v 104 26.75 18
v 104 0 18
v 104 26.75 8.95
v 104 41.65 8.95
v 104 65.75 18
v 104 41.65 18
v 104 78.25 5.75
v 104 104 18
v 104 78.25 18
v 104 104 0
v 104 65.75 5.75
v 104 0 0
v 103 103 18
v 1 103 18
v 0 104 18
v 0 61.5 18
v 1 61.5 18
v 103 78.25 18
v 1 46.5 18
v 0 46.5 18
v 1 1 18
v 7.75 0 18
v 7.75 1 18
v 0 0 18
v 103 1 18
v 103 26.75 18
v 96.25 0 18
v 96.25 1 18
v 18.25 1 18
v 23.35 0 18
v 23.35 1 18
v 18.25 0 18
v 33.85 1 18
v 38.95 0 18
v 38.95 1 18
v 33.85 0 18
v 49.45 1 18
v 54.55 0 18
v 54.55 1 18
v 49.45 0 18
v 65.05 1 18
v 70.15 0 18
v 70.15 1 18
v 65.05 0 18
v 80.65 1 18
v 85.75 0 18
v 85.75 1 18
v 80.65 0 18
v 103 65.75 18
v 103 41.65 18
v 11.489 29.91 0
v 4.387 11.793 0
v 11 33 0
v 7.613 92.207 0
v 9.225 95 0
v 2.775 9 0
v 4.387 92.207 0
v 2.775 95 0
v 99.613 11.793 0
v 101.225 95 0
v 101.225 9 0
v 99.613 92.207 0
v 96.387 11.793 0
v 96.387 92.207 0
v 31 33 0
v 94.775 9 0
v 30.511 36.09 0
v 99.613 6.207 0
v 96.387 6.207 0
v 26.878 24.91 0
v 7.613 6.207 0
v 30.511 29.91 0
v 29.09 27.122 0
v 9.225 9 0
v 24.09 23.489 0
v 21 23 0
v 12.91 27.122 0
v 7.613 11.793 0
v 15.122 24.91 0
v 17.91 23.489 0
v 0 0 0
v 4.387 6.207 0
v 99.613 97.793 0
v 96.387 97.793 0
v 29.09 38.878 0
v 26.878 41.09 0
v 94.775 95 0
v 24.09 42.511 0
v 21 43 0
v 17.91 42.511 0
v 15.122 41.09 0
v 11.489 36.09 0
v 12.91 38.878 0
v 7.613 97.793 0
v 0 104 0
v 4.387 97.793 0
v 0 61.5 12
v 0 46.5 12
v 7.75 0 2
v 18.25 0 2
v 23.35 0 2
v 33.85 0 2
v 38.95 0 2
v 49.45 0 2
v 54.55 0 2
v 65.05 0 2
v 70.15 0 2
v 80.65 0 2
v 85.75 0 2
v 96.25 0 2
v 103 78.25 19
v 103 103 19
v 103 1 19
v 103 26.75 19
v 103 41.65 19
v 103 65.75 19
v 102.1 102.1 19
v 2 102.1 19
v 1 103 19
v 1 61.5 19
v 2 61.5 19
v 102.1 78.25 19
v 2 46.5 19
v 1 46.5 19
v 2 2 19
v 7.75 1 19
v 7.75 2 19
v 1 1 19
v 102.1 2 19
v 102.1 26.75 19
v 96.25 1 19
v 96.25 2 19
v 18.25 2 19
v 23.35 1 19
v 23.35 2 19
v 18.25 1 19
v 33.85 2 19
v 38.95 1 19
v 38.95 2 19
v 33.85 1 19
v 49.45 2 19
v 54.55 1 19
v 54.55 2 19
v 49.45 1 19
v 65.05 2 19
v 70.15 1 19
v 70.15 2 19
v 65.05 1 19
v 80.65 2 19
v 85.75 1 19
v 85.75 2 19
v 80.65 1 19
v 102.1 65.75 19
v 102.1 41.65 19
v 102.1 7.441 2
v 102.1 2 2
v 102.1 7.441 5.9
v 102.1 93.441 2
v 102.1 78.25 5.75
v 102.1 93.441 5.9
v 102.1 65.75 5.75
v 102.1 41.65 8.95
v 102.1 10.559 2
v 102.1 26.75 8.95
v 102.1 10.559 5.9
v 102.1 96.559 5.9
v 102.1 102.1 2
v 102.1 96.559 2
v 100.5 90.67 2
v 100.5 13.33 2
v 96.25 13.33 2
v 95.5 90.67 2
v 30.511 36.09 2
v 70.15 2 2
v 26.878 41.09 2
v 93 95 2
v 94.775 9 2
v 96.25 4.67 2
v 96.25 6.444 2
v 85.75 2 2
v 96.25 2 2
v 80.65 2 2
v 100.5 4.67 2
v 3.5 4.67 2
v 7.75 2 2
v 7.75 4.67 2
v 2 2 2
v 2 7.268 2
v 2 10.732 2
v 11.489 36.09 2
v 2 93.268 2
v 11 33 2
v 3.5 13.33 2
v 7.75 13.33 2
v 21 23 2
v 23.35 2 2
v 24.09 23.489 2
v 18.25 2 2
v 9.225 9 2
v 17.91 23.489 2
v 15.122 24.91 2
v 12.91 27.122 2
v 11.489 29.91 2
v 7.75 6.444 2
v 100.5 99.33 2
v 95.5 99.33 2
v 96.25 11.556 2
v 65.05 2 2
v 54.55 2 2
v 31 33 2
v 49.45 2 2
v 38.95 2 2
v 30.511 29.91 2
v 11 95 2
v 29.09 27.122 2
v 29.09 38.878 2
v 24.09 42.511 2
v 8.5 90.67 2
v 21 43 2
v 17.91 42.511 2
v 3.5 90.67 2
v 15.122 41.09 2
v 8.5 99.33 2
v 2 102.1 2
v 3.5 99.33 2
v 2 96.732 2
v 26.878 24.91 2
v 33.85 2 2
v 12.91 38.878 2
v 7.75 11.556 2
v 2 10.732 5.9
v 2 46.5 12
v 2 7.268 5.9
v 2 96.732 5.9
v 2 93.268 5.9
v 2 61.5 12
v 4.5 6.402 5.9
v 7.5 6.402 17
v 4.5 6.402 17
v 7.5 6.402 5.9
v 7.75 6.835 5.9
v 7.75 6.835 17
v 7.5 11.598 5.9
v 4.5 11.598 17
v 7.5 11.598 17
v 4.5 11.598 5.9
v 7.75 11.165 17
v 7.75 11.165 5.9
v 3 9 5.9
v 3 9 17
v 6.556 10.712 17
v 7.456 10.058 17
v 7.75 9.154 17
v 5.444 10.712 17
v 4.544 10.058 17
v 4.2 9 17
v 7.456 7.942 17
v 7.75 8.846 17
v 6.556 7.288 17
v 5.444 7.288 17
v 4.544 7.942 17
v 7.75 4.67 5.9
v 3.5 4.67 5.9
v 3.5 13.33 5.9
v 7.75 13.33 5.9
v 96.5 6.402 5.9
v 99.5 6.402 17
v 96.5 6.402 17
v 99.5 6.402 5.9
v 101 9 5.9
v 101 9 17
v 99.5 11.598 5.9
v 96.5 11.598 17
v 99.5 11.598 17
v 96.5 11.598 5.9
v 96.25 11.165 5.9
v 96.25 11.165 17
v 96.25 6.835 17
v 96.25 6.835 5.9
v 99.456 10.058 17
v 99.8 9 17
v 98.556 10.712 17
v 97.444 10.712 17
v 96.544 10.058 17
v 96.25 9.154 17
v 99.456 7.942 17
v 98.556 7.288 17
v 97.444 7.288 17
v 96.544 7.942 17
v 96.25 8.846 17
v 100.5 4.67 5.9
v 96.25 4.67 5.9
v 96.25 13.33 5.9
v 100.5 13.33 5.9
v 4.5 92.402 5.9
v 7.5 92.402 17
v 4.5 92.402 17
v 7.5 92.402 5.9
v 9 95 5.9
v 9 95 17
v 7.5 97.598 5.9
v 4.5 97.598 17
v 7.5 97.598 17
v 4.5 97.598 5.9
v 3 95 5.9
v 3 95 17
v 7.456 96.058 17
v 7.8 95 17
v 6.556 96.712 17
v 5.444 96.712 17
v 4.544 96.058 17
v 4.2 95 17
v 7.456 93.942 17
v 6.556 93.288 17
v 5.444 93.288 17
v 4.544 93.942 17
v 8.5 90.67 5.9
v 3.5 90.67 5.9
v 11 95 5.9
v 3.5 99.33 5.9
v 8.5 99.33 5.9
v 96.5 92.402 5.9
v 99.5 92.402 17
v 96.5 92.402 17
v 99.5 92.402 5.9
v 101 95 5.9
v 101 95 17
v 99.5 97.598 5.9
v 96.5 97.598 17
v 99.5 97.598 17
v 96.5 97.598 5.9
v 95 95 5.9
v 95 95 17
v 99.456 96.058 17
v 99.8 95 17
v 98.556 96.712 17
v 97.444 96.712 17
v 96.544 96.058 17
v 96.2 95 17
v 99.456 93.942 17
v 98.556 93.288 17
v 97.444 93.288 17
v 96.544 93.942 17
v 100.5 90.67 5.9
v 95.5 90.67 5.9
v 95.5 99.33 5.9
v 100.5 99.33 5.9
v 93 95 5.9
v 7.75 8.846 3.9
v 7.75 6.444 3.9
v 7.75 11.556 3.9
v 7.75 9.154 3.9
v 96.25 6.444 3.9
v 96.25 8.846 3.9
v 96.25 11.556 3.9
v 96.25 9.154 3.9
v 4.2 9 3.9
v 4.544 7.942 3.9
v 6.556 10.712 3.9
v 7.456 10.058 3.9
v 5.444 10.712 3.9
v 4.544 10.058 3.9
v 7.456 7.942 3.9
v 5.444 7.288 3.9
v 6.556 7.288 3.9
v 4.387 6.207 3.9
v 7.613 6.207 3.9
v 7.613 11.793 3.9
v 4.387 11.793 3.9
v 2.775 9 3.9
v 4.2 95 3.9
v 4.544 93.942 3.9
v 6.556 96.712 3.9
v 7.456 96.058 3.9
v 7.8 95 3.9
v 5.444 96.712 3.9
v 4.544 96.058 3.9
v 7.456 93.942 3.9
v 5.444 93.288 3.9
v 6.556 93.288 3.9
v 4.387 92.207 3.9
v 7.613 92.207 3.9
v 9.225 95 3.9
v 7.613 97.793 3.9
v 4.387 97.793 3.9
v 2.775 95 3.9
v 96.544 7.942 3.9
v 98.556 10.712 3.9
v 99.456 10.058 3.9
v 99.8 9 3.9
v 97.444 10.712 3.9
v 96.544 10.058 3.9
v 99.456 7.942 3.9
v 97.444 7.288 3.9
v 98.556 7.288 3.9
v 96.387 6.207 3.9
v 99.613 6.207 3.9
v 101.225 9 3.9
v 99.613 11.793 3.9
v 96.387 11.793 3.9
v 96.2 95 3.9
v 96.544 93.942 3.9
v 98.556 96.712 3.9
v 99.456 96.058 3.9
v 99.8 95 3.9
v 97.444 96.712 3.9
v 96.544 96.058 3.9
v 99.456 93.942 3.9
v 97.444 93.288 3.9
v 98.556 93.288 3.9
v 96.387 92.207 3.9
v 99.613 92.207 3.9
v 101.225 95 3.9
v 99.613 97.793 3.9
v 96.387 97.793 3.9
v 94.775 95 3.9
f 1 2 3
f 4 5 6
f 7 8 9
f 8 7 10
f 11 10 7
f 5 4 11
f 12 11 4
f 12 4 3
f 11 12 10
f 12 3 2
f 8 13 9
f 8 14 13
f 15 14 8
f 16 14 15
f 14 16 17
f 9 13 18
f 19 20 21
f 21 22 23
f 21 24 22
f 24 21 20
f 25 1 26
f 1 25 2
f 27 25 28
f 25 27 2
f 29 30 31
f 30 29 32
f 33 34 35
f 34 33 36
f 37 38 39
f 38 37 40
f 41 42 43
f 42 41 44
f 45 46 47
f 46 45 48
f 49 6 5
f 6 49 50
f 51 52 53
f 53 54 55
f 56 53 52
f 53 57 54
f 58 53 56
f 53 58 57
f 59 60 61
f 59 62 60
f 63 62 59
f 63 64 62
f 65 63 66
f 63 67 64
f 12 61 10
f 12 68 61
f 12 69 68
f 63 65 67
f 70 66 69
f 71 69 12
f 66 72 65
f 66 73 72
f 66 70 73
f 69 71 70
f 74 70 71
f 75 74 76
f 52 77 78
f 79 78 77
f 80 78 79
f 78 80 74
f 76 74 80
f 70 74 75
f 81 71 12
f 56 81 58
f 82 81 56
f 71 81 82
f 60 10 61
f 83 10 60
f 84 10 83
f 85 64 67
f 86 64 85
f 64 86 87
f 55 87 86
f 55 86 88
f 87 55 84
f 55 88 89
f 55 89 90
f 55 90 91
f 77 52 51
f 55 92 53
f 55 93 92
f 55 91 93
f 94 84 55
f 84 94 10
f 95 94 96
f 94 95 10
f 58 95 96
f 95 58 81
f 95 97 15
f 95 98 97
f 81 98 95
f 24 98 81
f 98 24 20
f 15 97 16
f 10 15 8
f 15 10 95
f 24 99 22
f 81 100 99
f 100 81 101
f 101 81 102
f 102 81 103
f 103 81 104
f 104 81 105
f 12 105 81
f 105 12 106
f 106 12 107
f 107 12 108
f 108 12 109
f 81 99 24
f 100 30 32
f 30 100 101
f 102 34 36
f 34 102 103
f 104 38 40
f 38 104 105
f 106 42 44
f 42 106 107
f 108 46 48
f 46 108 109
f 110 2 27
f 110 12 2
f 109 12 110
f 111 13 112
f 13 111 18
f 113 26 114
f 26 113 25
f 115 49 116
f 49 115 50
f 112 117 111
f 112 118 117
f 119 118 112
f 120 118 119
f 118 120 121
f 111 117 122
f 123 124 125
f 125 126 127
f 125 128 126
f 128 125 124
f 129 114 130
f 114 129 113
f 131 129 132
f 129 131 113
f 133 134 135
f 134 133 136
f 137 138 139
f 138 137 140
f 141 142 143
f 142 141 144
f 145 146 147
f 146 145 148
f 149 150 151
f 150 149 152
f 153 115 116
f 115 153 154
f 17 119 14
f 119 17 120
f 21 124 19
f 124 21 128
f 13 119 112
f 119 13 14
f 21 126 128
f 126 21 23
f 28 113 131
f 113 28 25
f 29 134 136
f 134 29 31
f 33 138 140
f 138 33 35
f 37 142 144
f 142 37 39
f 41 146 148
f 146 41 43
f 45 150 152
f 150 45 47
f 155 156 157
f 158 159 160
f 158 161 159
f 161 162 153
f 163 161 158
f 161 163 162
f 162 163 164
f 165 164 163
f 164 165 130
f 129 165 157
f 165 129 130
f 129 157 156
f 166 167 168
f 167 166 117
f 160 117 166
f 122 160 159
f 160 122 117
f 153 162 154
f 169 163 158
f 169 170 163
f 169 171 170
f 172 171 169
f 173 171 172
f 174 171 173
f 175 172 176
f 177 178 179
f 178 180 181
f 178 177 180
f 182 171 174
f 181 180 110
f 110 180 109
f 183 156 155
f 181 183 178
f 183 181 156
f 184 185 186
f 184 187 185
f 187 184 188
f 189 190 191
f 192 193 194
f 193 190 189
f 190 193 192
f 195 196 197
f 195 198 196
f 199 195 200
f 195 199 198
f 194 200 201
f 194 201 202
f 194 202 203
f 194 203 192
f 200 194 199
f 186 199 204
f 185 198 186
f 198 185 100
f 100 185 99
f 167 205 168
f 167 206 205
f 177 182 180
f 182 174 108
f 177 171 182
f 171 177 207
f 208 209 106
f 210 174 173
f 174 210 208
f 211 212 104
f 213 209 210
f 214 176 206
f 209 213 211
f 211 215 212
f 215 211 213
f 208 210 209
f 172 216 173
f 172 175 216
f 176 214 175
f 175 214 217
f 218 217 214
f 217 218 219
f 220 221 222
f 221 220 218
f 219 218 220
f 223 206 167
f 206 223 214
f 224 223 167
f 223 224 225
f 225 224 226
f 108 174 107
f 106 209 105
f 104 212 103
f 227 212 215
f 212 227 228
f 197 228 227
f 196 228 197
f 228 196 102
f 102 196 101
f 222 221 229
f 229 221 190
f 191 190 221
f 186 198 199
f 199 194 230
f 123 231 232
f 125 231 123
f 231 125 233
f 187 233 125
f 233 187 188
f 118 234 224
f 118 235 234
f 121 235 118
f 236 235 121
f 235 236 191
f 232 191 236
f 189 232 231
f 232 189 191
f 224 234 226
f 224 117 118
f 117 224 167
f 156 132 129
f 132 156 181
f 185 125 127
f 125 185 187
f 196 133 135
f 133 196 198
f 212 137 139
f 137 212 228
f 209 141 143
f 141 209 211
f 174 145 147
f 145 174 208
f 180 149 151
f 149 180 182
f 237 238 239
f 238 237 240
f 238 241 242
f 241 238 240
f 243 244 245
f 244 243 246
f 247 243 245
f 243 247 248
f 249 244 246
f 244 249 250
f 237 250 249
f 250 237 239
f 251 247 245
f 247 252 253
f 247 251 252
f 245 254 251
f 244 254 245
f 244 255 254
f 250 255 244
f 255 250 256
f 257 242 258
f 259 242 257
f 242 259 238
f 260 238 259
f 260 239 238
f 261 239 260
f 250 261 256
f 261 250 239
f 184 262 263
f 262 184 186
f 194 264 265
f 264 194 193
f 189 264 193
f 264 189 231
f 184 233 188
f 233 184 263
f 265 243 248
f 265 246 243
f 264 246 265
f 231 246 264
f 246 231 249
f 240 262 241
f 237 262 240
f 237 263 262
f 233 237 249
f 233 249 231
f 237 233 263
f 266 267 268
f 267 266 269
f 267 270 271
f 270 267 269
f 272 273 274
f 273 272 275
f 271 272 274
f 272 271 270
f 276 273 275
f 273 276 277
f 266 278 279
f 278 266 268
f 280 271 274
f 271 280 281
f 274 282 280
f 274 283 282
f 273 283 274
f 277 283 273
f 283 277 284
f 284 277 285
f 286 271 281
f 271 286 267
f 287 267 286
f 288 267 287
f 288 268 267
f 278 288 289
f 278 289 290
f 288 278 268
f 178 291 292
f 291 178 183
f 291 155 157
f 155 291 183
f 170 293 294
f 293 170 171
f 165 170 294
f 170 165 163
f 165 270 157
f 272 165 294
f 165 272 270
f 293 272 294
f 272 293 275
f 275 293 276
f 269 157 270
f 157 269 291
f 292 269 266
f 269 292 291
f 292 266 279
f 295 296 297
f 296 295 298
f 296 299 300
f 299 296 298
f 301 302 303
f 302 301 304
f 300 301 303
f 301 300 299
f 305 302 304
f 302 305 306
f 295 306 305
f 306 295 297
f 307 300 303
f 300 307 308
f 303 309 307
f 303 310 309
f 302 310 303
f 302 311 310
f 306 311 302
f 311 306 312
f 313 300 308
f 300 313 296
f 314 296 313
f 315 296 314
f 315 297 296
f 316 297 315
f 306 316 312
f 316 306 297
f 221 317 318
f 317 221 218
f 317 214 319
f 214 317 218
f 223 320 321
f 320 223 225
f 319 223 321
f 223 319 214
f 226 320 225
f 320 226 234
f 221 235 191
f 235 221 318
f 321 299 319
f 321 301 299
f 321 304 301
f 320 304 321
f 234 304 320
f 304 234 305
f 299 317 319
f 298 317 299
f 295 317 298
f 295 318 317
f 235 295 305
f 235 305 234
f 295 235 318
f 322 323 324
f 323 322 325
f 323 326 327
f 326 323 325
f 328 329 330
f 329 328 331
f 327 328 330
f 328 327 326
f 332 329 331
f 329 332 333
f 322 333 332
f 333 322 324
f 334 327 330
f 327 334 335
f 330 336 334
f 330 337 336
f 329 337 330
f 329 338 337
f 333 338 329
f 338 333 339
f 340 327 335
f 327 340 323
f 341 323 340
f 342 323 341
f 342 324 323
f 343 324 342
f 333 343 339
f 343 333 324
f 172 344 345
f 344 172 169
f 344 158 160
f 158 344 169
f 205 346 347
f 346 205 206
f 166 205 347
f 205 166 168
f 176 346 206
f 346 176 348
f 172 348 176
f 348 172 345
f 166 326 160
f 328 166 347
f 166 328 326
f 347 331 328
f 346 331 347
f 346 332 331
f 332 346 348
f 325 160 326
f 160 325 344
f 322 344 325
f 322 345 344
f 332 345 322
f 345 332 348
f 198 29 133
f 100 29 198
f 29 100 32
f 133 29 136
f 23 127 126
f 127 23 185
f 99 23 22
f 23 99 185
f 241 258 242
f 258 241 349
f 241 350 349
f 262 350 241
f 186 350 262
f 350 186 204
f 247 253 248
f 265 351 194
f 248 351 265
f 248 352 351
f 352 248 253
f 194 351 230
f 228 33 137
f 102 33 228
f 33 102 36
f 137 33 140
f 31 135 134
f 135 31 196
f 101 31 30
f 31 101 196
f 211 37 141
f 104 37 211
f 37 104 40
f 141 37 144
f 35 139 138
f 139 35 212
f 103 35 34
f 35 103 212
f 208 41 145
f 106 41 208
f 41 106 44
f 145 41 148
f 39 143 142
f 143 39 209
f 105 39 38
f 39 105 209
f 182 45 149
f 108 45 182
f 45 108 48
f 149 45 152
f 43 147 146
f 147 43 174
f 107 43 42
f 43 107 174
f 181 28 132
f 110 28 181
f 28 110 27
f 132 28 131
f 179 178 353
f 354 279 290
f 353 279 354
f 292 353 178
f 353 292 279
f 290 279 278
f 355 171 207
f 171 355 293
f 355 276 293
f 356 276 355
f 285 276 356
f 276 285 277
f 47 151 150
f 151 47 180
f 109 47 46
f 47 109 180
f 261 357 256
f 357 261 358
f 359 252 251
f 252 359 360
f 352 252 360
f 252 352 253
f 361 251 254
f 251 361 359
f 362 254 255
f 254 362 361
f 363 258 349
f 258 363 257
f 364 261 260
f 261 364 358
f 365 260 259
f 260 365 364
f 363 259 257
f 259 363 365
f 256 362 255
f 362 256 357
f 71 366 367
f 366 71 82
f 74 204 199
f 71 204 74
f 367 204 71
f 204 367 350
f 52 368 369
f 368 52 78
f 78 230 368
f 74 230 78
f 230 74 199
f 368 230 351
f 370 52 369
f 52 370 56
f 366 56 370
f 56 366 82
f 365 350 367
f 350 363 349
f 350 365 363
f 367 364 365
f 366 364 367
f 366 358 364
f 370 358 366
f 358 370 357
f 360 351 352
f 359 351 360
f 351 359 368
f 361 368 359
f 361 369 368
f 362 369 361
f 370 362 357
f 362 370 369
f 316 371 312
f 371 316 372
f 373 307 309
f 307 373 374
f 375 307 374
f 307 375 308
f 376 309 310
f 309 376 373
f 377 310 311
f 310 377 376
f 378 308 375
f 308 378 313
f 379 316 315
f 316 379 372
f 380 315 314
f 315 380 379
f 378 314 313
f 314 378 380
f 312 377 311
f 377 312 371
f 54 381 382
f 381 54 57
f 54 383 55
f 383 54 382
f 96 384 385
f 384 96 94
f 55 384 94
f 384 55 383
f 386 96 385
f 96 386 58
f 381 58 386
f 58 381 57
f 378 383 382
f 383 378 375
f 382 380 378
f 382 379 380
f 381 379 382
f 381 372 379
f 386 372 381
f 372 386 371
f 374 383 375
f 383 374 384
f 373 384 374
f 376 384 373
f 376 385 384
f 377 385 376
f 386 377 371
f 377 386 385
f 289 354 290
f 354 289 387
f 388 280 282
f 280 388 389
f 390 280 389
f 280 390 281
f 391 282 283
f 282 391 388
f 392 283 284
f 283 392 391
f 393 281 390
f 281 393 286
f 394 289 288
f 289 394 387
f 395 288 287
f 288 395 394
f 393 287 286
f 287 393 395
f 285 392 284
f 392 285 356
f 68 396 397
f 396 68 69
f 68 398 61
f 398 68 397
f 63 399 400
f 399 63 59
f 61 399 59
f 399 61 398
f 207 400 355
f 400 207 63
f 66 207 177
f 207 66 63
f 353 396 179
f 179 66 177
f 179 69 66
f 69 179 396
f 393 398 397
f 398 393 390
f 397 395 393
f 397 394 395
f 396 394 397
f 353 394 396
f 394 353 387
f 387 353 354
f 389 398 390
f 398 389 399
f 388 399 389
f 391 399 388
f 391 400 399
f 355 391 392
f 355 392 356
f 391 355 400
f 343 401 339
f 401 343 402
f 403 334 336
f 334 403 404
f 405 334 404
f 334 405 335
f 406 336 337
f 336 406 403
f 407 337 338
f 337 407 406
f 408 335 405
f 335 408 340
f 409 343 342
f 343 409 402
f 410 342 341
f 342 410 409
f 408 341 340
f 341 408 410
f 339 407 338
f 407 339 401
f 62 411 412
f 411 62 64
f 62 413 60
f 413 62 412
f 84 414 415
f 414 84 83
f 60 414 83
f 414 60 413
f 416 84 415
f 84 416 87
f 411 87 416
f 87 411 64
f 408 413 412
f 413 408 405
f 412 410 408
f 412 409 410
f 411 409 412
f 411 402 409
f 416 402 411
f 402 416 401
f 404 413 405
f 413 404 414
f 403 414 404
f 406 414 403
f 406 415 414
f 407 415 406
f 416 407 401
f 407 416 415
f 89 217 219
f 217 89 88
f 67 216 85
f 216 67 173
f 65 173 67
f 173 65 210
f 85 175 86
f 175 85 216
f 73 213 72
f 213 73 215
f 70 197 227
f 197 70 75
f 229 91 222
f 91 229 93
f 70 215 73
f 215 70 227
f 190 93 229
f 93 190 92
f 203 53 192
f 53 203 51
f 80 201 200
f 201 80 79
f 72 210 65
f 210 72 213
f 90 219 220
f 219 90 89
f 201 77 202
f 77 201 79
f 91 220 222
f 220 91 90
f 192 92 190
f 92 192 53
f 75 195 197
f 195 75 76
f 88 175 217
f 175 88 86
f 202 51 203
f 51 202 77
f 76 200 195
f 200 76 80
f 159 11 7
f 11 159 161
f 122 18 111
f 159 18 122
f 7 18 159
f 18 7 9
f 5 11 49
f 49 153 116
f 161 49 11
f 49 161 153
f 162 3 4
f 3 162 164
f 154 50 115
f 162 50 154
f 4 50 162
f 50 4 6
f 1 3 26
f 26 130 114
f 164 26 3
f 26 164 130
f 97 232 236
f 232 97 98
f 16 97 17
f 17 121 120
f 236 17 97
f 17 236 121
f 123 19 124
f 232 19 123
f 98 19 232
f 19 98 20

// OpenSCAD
tol = 0.25;
screen_tol = 0.8;
pcb_x = 100;
pcb_y = 100;
pcb_z = 4;
bolt_d = 3.6;
shift_bolt = 3;
shift_bolt_x = 4;
shift_bolt_y = 7;
board_w = 1;
board_h = 1;


// box thickness
th = 2;

// bolts
shift_x = th;
shift_y = th;

box_x = pcb_x + 2*th;
box_y = pcb_y + 2*th;

pcb_width = 2;

socket_h = 15;
socket_w = 10;
socket_n = 6;
socket_int = 15.6;
start_socket_x = 6 + shift_x;
eps = 1e-1;

bottom_box_z = socket_h + th + pcb_width;

usb_type_b_w = 12;
usb_type_b_h = 11;
start_type_b_y = shift_y + pcb_y - 36;
start_type_b_z = bottom_box_z - pcb_width - usb_type_b_h - tol;

usb_type_a_w = 14.4;
usb_type_a_h = 7.8;
start_type_a_y = shift_y + 25;
start_type_a_z = bottom_box_z - pcb_width - usb_type_a_h - tol;

// programmator
micro_x = 10;
micro_y = 21.1;
micro_start_x = shift_x + 4.75;
micro_start_y = shift_y + pcb_y - 23.3 - micro_y;

contrast_start_x = shift_x + 38.4;
contrast_start_y = shift_y + 25.7;
//volume_start_x = shift_x + pcb_x - 39.2;
//volume_start_y = contrast_start_y;
pot_d = 7;
under_pcb = 13;
fn = 10;
gaika_h = 4;
gaika_w = 5.5;
stoiki_r = 3;
stoiki_h = socket_h;
wide_stoiki_r = stoiki_r + 2;

dynamic_x = shift_x + 19;
dynamic_y = shift_y + 31;
dynamic_r = 10;

volume_center_y = shift_y + 50;
volume_w = 15;
volume_start_y = shift_y + volume_center_y - volume_w/2;
volume_h = 5;

translate([0,0,-50]) {

!difference() {
  union() {
    difference() {
      union() {
        cube([box_x, box_y, bottom_box_z-board_h], false);
        translate([th - board_w, th - board_w, 0]) {
          cube([box_x - 2*(th - board_w), box_y - 2*(th - board_w), bottom_box_z], false);
        }
      }
      translate([th, th, th]) {
        cube([box_x-2*th+eps, box_y-2*th+eps, bottom_box_z-th+eps], false);
      }
    }
    // under_pcb, stoiki
    for (dy = [shift_y+shift_bolt_y, shift_y+pcb_y-shift_bolt_y]) {
      for (dx = [shift_x+shift_bolt_x, shift_x+pcb_x-shift_bolt_x]) {
        translate([dx,dy,th-eps]) {
          cylinder($fn=6, r=stoiki_r, h=stoiki_h + eps);
          cylinder($fn=6, r=wide_stoiki_r, h=gaika_h);
        }
      }
    }
    //translate([box_x/2, box_y/2, th-eps]) {
      //cylinder($fn=6, r=stoiki_r, h=pcb_up);
    //}
  }

  // dynamic
  translate([dynamic_x, dynamic_y, -eps]) {
      cylinder($fn=20, r=dynamic_r, h = th+2*eps);
  }

  // sockets
  for (i = [0:1:socket_n-1]) {
      translate([start_socket_x+i*socket_int - tol, -eps, bottom_box_z - socket_h - pcb_width]) {
        cube(size=[socket_w + 2*tol, socket_h, socket_h + socket_h]);
      }
  }
  // bolts
  for (dx = [shift_x+shift_bolt_x, shift_x+pcb_x-shift_bolt_x]) {
    for (dy = [shift_y+shift_bolt_y, shift_y+pcb_y-shift_bolt_y]) {
      translate([dx,dy,-eps]) {
        cylinder($fn=fn, r=bolt_d/2, h=th+stoiki_h+2*eps);
        // gaika
        cylinder($fn=6, r=gaika_w / 2 / cos(30) + 0.05, h=gaika_h);
      }
    }
  }

//    // usb_in1 type b
    translate([box_x-th-eps, start_type_b_y-tol, start_type_b_z]) {
        cube(size=[th+2*eps, usb_type_b_w + 2*tol, bottom_box_z]);
    }

    // usb_out1 type a
    translate([box_x - eps - th, start_type_a_y - tol, start_type_a_z]) {
        cube(size=[th+2*eps, usb_type_a_w + 2*tol, bottom_box_z]);
    }

    // volume
    translate([-eps, volume_start_y, bottom_box_z - pcb_width - volume_h]) {
        cube(size=[th+2*eps, volume_w, volume_h + th + eps]);
    }

}
}

top_box_z = 15 + th;
//stoiki_h = top_box_z - th;
wide_stoiki_h = 4;
pcb_room = 1;
screen_start_x = shift_x + 29;
screen_start_y = shift_y + 38.9;
screen_length_x = 71.2;
screen_length_y = 24.2;
screen_hold_x = 40;
screen_hold_y = 4;
screen_hold_start_z = 12.5;
screen_hold_y_shift = 2;
screen_hold_up_x = 15;
screen_hold_up_x_shift = 5;

master_button_y = shift_y + 10;
master_button_x = shift_x + 43;
master_button_int = 21.8;
master_button_r = 5;
top_bolt_h = 1.5;
top_bolt_r = 3.5;
speaker_shift = 18;
speaker_r = 15;
speaker_h = 15;
speaker_hole_d = 10;
speaker_hole_int = 3;
speaker_hole_w = 1.5;
speaker_shift = 18;

difference() {
  union() {
    // board
    translate([0, 0, -board_h]) {
        difference() {
            cube([box_x, box_y, board_h + eps], false);
            translate([board_w, board_w, -eps]) {
                cube([box_x - 2*board_w, box_y - 2*board_w, board_h + 3*eps], false);
            }
        }
    }
    difference() {
      cube([box_x,box_y,top_box_z], false);
      translate([th, th, -eps]) {
        cube([box_x-2*th+eps, box_y-2*th+eps, top_box_z-th+eps], false);
      }
    }
    // stoiki
    for (dx = [shift_x+shift_bolt, shift_x+pcb_x-shift_bolt]) {
      for (dy = [shift_y+shift_bolt, shift_y+pcb_y-shift_bolt]) {
        translate([dx,dy,pcb_room]) {
          cylinder($fn=6, r=stoiki_r, h=top_box_z-th+eps);
        }
        translate([dx,dy,top_box_z-th-wide_stoiki_h+eps]) {
          cylinder($fn=6, r=wide_stoiki_r, h=wide_stoiki_h+th-2*eps);
        }
      }
    }
    // screen_hold
    translate([screen_start_x + (screen_length_x - screen_hold_x)/2, screen_start_y - screen_hold_y_shift - screen_hold_y, screen_hold_start_z]) {
	cube([screen_hold_x, screen_hold_y, top_box_z - screen_hold_start_z - th + eps]);
    }
    translate([screen_start_x + screen_length_x - screen_hold_up_x - screen_hold_up_x_shift, screen_start_y + screen_length_y + screen_hold_y_shift, screen_hold_start_z]) {
	cube([screen_hold_up_x, screen_hold_y, top_box_z - screen_hold_start_z - th + eps]);
    }
  }
  // - speaker na stoikah
  translate([shift_x + pcb_x - 18, shift_y + 18, 0]) {
    cylinder(r=speaker_r, h = 15, $fn=20);
  }
  // speaker_hole
  for (dy = [shift_y + speaker_shift - speaker_hole_int - speaker_hole_w*3/2, 
             shift_y + speaker_shift - speaker_hole_w/2, 
             shift_y + speaker_shift + speaker_hole_int + speaker_hole_w/2]) { 
    translate([shift_x + pcb_x - speaker_shift - speaker_hole_d, dy, top_box_z-th-eps]) {
      cube(size=[speaker_hole_d, speaker_hole_w, th + 2*eps]);
    }
  }

  // bolts
  for (dx = [shift_x+shift_bolt, shift_x+pcb_x-shift_bolt]) {
    for (dy = [shift_y+shift_bolt, shift_y+pcb_y-shift_bolt]) {
      translate([dx,dy,-eps]) {
        cylinder($fn=fn, r=bolt_d/2, h=top_box_z+2*eps);
      }
      translate([dx, dy, top_box_z - top_bolt_h]) {
        //cylinder($fn=6, r=gaika_w / 2 / cos(30) + 0.05, h=wide_stoiki_h+eps);
        cylinder($fn=6, r=top_bolt_r, h=top_bolt_h + eps);
      }
    }
  }

  // screen
  translate([screen_start_x - screen_tol, screen_start_y - screen_tol, top_box_z - th - eps]) {
      cube([screen_length_x + 2*screen_tol, screen_length_y + 2*screen_tol, th + 2*eps]);
  }
  // sockets
  for (i = [0:1:socket_n-1]) {
      translate([start_socket_x+i*socket_int - tol, box_y-th-eps, -eps - board_h]) {
        cube(size=[socket_w + 2*tol, th+2*eps, socket_h + board_h]);
      }
  }
  // type_b
  translate([box_x - th - eps, start_type_b_y - tol, -tol - board_h]) {
      cube([th + 2*eps, usb_type_b_w + 2*tol, usb_type_b_h + 2*tol + board_h]);
  }
  // type_a
  translate([-eps, start_type_a_y - tol, -eps - board_h]) {
      cube([th + 2*eps, usb_type_a_w + 2*tol, usb_type_a_h + 2*eps + board_h]);
  }
  // master buttons
  for (i = [0:1:2]) {
    translate([master_button_x + master_button_int*i, master_button_y, top_box_z - th - eps]) {
      cylinder($fn=fn, r=master_button_r + tol, h=th+2*eps);
    }
  }
}


//// bolts
//for (dx = [shift_x+shift_bolt, shift_x+pcb_x-shift_bolt]) {
//  for (dy = [shift_y+shift_bolt, shift_y+pcb_y-shift_bolt]) {
//    difference() {
//      translate([dx,dy,pcb_up/2+th]) {
//        cube(size=[a,a,pcb_up], center=true);
//      }
//      translate([dx,dy,-eps]) {
//        cylinder($fn=20, r=bolt_d/2, h=th+pcb_up+2*eps);
//      }
//    }
//  }
//}


//leg_r = t;
//shift = t/2+leg_r;
//for (dx = [shift, a-shift])
//    for (dy = [shift, b-shift]) {
//        translate([dx, dy, 0]) {
//            cylinder(h=c, r=leg_r, $fn=40);
//        }
//    }
